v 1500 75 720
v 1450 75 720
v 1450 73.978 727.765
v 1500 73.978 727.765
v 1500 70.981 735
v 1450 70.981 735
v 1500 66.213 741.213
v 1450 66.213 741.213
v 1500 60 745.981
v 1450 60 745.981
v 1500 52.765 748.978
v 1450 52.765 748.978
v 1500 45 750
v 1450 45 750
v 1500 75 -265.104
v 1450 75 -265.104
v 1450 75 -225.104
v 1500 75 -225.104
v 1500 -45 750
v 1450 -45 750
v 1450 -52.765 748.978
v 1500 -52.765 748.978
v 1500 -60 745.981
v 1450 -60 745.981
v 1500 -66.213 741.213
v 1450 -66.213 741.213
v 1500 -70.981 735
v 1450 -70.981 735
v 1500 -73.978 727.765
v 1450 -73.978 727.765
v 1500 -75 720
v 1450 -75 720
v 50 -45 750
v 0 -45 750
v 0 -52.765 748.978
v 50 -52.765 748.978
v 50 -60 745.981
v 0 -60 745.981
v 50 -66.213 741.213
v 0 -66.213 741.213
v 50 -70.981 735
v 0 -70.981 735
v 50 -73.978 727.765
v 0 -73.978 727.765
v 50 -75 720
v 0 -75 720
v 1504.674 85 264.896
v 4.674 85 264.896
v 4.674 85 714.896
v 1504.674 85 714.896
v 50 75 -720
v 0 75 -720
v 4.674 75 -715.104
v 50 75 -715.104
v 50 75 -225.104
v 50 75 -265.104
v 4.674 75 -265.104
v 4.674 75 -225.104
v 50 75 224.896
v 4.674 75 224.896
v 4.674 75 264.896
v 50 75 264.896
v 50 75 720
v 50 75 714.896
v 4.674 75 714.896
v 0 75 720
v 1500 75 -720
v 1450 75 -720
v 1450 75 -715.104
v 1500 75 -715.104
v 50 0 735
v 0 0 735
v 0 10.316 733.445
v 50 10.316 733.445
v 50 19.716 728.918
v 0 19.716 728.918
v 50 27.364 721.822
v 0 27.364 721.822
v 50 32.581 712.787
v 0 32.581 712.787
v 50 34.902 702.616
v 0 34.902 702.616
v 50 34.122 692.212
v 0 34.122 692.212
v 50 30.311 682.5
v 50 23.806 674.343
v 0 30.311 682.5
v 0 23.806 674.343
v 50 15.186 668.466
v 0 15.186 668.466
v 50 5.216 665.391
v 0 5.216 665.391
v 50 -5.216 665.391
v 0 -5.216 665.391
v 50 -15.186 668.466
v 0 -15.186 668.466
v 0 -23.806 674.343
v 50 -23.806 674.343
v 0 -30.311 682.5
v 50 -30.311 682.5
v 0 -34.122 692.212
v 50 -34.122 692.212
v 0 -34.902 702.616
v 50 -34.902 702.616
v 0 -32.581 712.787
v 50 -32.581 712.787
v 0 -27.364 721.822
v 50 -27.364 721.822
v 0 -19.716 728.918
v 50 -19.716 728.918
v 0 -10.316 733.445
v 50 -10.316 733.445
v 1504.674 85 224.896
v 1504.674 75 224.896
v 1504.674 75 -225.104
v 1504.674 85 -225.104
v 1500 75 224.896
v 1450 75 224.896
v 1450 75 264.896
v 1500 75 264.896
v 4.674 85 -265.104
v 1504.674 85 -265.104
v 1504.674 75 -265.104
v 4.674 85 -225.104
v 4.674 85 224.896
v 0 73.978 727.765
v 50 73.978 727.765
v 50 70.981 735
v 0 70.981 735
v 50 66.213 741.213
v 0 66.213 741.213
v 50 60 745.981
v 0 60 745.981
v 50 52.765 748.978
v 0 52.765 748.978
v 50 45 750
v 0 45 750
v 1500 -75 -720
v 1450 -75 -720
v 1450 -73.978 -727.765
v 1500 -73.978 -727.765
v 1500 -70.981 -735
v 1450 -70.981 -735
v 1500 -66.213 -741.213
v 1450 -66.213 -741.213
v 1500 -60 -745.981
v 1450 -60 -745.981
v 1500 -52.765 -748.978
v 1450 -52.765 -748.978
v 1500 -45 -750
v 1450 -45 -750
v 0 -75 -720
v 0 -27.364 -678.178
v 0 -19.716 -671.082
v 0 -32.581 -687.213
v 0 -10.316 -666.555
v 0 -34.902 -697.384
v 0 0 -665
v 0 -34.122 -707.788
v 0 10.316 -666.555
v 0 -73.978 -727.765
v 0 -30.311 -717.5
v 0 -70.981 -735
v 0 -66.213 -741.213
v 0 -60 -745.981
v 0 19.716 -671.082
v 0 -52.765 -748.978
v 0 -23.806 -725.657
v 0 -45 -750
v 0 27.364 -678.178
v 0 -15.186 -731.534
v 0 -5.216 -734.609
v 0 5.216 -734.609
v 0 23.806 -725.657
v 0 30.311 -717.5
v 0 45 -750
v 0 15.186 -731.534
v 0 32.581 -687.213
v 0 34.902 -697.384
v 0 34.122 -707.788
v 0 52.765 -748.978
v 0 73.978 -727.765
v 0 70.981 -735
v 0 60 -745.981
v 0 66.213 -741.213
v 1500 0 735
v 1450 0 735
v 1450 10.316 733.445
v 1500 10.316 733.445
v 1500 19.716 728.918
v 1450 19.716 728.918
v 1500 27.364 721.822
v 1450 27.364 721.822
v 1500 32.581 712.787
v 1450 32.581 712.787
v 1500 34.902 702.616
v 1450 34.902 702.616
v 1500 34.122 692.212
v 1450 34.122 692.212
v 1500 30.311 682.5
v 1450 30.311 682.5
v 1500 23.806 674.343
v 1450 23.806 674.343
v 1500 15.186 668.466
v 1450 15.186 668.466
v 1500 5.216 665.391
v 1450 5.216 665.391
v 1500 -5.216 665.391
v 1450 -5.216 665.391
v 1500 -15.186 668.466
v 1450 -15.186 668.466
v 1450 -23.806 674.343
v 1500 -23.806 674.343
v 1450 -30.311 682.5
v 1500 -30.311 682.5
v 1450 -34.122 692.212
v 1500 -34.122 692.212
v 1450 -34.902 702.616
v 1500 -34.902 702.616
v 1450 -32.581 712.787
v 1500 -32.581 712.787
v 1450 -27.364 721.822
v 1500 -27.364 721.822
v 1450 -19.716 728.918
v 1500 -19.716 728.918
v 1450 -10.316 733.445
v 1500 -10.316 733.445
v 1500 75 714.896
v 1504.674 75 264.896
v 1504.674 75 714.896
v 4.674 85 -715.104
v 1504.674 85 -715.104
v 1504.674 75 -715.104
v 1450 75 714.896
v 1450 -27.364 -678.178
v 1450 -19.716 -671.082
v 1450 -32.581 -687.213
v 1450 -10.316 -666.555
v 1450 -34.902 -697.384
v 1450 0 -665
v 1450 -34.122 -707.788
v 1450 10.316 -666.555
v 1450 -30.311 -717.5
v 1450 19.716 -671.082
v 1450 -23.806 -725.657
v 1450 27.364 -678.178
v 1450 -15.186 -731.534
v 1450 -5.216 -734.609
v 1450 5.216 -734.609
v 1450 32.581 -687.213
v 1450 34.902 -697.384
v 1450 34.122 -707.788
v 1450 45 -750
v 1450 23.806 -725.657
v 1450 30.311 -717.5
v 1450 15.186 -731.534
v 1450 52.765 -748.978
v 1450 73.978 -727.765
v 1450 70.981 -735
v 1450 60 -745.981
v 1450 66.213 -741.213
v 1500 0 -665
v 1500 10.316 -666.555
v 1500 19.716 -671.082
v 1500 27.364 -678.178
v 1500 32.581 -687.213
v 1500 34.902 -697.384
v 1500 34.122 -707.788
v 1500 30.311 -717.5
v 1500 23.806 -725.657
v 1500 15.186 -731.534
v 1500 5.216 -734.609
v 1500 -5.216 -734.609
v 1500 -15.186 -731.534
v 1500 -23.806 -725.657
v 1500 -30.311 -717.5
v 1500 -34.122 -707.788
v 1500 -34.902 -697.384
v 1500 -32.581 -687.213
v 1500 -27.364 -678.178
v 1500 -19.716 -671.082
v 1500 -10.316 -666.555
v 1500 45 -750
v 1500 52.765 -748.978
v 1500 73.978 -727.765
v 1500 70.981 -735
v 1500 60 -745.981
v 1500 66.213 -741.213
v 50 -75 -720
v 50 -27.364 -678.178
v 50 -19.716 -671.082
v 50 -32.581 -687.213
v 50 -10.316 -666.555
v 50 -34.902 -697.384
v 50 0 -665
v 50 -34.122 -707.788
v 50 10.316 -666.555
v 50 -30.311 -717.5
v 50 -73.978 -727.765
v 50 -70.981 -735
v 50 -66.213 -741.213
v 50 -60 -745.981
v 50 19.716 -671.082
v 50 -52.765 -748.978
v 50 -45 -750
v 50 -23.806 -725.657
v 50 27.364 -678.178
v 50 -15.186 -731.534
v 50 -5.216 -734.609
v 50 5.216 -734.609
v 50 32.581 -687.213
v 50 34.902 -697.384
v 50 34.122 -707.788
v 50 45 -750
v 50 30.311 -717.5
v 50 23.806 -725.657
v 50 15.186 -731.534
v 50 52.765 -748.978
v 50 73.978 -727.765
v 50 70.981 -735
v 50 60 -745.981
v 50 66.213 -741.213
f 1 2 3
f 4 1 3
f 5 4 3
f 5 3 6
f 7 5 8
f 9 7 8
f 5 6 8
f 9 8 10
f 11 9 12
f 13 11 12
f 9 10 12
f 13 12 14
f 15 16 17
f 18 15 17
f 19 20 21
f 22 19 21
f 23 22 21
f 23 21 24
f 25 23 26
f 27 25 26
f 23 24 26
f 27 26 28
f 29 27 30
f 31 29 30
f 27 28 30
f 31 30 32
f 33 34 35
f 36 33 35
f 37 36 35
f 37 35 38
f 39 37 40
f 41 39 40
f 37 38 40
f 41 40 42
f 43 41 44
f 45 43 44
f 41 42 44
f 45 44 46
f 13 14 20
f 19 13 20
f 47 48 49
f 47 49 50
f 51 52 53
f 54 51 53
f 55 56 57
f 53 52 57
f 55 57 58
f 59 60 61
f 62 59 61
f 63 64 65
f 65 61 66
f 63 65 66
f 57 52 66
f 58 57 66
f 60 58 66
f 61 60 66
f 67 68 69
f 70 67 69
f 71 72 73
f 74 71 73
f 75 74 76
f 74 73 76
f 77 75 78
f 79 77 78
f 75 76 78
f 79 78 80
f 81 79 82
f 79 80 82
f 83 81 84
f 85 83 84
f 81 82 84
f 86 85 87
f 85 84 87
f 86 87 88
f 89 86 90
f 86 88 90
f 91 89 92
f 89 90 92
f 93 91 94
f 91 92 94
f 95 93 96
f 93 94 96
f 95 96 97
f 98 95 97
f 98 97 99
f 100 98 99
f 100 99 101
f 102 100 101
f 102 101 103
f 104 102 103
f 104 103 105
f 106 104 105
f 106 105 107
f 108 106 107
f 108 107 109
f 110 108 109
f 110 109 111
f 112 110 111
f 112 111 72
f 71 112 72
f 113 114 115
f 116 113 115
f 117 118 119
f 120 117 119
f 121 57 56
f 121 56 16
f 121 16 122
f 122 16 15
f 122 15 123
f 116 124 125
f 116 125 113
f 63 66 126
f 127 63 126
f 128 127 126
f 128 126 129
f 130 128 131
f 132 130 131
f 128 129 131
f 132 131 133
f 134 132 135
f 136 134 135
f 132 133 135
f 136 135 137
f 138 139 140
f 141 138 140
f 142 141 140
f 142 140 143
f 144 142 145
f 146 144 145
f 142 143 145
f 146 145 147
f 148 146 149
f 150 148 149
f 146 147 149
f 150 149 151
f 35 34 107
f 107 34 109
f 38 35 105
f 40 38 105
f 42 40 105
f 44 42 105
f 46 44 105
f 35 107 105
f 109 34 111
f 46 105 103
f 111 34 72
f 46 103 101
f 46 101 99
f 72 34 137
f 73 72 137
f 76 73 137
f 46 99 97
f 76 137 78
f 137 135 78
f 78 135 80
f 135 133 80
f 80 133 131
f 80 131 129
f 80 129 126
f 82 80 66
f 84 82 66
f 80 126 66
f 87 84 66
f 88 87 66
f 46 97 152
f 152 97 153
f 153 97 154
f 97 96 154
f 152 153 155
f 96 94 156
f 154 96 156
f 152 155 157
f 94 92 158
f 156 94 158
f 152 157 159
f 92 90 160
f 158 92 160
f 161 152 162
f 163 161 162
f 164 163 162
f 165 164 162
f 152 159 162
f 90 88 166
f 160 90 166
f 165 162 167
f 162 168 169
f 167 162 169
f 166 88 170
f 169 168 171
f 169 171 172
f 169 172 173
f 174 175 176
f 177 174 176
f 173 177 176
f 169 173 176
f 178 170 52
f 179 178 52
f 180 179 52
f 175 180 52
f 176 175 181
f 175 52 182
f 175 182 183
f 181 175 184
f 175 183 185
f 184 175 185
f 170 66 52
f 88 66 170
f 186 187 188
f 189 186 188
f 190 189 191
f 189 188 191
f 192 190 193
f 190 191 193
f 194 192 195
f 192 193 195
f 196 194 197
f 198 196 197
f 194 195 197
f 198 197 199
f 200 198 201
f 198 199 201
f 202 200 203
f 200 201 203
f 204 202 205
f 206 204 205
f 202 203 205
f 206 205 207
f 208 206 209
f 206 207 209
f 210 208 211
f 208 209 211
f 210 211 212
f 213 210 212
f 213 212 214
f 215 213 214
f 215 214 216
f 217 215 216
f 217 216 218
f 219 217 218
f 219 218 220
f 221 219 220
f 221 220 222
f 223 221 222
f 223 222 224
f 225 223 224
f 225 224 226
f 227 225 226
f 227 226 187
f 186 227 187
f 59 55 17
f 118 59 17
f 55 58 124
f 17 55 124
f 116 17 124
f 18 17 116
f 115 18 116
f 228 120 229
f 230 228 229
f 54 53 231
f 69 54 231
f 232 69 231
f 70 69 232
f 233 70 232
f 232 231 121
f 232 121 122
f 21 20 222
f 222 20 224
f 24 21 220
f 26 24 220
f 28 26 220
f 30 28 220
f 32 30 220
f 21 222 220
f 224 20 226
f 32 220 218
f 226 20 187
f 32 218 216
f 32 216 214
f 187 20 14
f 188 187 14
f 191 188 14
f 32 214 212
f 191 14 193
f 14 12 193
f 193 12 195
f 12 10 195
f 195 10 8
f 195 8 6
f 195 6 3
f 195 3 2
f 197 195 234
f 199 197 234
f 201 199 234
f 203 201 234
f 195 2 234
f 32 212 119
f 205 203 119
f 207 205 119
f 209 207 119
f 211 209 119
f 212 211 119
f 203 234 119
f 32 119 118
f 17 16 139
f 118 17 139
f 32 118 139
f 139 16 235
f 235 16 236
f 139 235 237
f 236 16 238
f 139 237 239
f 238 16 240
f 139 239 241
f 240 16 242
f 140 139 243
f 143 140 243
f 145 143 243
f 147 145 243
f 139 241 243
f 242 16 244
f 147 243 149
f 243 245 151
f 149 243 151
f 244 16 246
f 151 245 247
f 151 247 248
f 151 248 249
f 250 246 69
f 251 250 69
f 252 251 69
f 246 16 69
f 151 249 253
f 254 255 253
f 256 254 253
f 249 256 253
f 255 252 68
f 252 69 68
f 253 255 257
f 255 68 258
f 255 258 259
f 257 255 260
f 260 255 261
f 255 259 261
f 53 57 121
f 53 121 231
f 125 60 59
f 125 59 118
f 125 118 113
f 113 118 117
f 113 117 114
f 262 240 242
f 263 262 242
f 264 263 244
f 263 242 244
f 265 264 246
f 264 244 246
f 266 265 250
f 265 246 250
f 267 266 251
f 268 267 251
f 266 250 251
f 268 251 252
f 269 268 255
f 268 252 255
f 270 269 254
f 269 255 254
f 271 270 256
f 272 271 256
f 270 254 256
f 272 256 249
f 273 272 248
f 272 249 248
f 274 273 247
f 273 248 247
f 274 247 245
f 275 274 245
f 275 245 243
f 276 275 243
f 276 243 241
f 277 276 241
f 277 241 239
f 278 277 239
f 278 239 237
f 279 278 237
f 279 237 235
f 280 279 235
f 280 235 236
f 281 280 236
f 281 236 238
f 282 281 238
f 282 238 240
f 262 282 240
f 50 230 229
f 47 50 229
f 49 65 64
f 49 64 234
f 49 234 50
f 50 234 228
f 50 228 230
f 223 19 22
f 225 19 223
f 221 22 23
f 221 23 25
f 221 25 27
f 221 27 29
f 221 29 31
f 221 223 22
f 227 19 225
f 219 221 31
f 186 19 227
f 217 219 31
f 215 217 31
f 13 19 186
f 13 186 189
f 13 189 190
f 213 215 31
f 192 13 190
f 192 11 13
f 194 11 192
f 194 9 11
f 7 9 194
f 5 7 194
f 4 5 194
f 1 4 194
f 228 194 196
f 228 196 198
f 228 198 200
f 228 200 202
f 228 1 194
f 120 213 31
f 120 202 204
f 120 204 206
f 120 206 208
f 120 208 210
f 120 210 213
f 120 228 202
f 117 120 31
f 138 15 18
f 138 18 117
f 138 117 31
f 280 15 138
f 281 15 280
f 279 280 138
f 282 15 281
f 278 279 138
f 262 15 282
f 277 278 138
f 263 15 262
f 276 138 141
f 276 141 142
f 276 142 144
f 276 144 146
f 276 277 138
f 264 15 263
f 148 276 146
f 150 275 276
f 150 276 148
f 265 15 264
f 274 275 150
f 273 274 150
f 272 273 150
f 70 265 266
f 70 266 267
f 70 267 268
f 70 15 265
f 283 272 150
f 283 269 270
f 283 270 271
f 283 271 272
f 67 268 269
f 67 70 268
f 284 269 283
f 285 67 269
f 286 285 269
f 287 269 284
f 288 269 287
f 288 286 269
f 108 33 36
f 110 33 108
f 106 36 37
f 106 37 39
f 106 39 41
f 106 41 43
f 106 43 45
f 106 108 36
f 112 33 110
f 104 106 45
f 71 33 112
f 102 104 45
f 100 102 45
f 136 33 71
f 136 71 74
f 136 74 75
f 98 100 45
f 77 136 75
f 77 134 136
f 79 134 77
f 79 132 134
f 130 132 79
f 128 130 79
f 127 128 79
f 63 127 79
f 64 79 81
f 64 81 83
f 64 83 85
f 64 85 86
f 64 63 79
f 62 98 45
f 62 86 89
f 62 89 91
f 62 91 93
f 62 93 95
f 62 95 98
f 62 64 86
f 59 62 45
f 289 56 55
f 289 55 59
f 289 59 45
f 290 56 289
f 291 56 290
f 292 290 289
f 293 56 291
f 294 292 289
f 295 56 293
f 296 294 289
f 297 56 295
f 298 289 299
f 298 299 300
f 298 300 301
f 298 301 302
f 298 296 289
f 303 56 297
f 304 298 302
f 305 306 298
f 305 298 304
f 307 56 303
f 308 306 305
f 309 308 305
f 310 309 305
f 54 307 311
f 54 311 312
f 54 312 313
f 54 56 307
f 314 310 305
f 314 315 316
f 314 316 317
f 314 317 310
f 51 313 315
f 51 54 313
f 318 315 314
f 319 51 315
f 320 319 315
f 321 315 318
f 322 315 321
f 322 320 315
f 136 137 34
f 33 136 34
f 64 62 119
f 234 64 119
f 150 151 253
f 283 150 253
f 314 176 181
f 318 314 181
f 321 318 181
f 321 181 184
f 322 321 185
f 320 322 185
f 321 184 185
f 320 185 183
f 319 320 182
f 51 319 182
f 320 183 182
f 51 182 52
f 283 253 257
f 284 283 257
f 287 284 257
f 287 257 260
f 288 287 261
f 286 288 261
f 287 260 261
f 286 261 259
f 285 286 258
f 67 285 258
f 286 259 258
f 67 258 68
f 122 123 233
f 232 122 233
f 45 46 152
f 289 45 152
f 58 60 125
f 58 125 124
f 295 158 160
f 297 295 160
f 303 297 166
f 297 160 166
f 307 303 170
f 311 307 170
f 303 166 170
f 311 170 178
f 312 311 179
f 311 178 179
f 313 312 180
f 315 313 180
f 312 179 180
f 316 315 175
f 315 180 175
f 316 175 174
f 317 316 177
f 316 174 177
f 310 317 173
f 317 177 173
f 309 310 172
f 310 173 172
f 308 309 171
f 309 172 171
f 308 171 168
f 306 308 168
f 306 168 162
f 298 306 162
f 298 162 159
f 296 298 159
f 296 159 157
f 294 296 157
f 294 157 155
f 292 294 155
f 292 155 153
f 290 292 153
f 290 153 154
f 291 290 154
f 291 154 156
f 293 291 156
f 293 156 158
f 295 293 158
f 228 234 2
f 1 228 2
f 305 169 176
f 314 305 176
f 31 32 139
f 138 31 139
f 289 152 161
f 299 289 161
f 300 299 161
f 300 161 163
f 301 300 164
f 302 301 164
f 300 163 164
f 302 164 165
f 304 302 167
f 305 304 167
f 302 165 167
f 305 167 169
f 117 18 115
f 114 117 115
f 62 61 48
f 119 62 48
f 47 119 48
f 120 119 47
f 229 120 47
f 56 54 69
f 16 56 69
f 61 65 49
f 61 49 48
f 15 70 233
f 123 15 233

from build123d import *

# Parameters (mm, degrees)
BOSS_EXTRUDE1_DEPTH = 50
SKETCH2_W           = 1500
SKETCH2_H           = 450
BOSS_EXTRUDE2_DEPTH = 10
LPATTERN1_COUNT     = 2
LPATTERN1_PITCH     = 1450
LPATTERN2_COUNT     = 3
LPATTERN2_PITCH     = 490
CUT_EXTRUDE1_REACH  = 1685.38
SKETCH3_R           = 35


with BuildPart() as part:
    # Sketch1 → Boss-Extrude1 (new body)
    with BuildSketch(Plane(origin=(0, 0, 0), x_dir=(0, 0, -1), z_dir=(1, 0, 0))):
        with BuildLine():
            Line((-720, -75), (720, -75))
            ThreePointArc((720, -75), (741.213203436, -66.213203436), (750, -45))
            Line((750, -45), (750, 45))
            ThreePointArc((750, 45), (741.213203436, 66.213203436), (720, 75))
            Line((720, 75), (-720, 75))
            ThreePointArc((-720, 75), (-741.213203436, 66.213203436), (-750, 45))
            Line((-750, 45), (-750, -45))
            ThreePointArc((-750, -45), (-741.213203436, -66.213203436), (-720, -75))
        make_face()
    boss_extrude1 = extrude(amount=BOSS_EXTRUDE1_DEPTH)

    # Sketch2 → Boss-Extrude2 (add)
    with BuildSketch(Plane(origin=(0, 75, 0), x_dir=(1, 0, 0), z_dir=(0, 1, 0))):
        with Locations((754.674039581, 490.104243835)):
            Rectangle(SKETCH2_W, SKETCH2_H)
    boss_extrude2 = extrude(amount=BOSS_EXTRUDE2_DEPTH)

    # LPattern1: Boss-Extrude1 ×2
    with Locations(*[(i * LPATTERN1_PITCH, 0, 0) for i in range(1, LPATTERN1_COUNT)]):
        add(boss_extrude1)

    # LPattern2: Boss-Extrude2 ×3
    with Locations(*[(0, 0, i * LPATTERN2_PITCH) for i in range(1, LPATTERN2_COUNT)]):
        add(boss_extrude2)

    # Cut-Extrude1: up to this face of the body (flat: up to its plane)
    cut_extrude1_end = Plane(part.part.faces().sort_by_distance((1500, 0, 0))[0])
    # Sketch3 → Cut-Extrude1 (cut, up to the picked face)
    with BuildSketch(Plane.ZY, mode=Mode.PRIVATE) as cut_extrude1_sk1:
        with Locations((-700, 0)):
            Circle(SKETCH3_R)
    cut_extrude1_tool1 = split(extrude(cut_extrude1_sk1.sketch, amount=-CUT_EXTRUDE1_REACH, mode=Mode.PRIVATE), bisect_by=cut_extrude1_end, keep=Keep.BOTH, mode=Mode.PRIVATE)
    # Sketch3 → Cut-Extrude1 (cut, up to the picked face)
    with BuildSketch(Plane.ZY, mode=Mode.PRIVATE) as cut_extrude1_sk2:
        with Locations((700, 0)):
            Circle(SKETCH3_R)
    cut_extrude1_tool2 = split(extrude(cut_extrude1_sk2.sketch, amount=-CUT_EXTRUDE1_REACH, mode=Mode.PRIVATE), bisect_by=cut_extrude1_end, keep=Keep.BOTH, mode=Mode.PRIVATE)
    add(cut_extrude1_tool1.solids().sort_by(Axis((0, 0, -700), (1, 0, 0)))[0], mode=Mode.SUBTRACT)
    add(cut_extrude1_tool2.solids().sort_by(Axis((0, 0, 700), (1, 0, 0)))[0], mode=Mode.SUBTRACT)


solid = part.part
